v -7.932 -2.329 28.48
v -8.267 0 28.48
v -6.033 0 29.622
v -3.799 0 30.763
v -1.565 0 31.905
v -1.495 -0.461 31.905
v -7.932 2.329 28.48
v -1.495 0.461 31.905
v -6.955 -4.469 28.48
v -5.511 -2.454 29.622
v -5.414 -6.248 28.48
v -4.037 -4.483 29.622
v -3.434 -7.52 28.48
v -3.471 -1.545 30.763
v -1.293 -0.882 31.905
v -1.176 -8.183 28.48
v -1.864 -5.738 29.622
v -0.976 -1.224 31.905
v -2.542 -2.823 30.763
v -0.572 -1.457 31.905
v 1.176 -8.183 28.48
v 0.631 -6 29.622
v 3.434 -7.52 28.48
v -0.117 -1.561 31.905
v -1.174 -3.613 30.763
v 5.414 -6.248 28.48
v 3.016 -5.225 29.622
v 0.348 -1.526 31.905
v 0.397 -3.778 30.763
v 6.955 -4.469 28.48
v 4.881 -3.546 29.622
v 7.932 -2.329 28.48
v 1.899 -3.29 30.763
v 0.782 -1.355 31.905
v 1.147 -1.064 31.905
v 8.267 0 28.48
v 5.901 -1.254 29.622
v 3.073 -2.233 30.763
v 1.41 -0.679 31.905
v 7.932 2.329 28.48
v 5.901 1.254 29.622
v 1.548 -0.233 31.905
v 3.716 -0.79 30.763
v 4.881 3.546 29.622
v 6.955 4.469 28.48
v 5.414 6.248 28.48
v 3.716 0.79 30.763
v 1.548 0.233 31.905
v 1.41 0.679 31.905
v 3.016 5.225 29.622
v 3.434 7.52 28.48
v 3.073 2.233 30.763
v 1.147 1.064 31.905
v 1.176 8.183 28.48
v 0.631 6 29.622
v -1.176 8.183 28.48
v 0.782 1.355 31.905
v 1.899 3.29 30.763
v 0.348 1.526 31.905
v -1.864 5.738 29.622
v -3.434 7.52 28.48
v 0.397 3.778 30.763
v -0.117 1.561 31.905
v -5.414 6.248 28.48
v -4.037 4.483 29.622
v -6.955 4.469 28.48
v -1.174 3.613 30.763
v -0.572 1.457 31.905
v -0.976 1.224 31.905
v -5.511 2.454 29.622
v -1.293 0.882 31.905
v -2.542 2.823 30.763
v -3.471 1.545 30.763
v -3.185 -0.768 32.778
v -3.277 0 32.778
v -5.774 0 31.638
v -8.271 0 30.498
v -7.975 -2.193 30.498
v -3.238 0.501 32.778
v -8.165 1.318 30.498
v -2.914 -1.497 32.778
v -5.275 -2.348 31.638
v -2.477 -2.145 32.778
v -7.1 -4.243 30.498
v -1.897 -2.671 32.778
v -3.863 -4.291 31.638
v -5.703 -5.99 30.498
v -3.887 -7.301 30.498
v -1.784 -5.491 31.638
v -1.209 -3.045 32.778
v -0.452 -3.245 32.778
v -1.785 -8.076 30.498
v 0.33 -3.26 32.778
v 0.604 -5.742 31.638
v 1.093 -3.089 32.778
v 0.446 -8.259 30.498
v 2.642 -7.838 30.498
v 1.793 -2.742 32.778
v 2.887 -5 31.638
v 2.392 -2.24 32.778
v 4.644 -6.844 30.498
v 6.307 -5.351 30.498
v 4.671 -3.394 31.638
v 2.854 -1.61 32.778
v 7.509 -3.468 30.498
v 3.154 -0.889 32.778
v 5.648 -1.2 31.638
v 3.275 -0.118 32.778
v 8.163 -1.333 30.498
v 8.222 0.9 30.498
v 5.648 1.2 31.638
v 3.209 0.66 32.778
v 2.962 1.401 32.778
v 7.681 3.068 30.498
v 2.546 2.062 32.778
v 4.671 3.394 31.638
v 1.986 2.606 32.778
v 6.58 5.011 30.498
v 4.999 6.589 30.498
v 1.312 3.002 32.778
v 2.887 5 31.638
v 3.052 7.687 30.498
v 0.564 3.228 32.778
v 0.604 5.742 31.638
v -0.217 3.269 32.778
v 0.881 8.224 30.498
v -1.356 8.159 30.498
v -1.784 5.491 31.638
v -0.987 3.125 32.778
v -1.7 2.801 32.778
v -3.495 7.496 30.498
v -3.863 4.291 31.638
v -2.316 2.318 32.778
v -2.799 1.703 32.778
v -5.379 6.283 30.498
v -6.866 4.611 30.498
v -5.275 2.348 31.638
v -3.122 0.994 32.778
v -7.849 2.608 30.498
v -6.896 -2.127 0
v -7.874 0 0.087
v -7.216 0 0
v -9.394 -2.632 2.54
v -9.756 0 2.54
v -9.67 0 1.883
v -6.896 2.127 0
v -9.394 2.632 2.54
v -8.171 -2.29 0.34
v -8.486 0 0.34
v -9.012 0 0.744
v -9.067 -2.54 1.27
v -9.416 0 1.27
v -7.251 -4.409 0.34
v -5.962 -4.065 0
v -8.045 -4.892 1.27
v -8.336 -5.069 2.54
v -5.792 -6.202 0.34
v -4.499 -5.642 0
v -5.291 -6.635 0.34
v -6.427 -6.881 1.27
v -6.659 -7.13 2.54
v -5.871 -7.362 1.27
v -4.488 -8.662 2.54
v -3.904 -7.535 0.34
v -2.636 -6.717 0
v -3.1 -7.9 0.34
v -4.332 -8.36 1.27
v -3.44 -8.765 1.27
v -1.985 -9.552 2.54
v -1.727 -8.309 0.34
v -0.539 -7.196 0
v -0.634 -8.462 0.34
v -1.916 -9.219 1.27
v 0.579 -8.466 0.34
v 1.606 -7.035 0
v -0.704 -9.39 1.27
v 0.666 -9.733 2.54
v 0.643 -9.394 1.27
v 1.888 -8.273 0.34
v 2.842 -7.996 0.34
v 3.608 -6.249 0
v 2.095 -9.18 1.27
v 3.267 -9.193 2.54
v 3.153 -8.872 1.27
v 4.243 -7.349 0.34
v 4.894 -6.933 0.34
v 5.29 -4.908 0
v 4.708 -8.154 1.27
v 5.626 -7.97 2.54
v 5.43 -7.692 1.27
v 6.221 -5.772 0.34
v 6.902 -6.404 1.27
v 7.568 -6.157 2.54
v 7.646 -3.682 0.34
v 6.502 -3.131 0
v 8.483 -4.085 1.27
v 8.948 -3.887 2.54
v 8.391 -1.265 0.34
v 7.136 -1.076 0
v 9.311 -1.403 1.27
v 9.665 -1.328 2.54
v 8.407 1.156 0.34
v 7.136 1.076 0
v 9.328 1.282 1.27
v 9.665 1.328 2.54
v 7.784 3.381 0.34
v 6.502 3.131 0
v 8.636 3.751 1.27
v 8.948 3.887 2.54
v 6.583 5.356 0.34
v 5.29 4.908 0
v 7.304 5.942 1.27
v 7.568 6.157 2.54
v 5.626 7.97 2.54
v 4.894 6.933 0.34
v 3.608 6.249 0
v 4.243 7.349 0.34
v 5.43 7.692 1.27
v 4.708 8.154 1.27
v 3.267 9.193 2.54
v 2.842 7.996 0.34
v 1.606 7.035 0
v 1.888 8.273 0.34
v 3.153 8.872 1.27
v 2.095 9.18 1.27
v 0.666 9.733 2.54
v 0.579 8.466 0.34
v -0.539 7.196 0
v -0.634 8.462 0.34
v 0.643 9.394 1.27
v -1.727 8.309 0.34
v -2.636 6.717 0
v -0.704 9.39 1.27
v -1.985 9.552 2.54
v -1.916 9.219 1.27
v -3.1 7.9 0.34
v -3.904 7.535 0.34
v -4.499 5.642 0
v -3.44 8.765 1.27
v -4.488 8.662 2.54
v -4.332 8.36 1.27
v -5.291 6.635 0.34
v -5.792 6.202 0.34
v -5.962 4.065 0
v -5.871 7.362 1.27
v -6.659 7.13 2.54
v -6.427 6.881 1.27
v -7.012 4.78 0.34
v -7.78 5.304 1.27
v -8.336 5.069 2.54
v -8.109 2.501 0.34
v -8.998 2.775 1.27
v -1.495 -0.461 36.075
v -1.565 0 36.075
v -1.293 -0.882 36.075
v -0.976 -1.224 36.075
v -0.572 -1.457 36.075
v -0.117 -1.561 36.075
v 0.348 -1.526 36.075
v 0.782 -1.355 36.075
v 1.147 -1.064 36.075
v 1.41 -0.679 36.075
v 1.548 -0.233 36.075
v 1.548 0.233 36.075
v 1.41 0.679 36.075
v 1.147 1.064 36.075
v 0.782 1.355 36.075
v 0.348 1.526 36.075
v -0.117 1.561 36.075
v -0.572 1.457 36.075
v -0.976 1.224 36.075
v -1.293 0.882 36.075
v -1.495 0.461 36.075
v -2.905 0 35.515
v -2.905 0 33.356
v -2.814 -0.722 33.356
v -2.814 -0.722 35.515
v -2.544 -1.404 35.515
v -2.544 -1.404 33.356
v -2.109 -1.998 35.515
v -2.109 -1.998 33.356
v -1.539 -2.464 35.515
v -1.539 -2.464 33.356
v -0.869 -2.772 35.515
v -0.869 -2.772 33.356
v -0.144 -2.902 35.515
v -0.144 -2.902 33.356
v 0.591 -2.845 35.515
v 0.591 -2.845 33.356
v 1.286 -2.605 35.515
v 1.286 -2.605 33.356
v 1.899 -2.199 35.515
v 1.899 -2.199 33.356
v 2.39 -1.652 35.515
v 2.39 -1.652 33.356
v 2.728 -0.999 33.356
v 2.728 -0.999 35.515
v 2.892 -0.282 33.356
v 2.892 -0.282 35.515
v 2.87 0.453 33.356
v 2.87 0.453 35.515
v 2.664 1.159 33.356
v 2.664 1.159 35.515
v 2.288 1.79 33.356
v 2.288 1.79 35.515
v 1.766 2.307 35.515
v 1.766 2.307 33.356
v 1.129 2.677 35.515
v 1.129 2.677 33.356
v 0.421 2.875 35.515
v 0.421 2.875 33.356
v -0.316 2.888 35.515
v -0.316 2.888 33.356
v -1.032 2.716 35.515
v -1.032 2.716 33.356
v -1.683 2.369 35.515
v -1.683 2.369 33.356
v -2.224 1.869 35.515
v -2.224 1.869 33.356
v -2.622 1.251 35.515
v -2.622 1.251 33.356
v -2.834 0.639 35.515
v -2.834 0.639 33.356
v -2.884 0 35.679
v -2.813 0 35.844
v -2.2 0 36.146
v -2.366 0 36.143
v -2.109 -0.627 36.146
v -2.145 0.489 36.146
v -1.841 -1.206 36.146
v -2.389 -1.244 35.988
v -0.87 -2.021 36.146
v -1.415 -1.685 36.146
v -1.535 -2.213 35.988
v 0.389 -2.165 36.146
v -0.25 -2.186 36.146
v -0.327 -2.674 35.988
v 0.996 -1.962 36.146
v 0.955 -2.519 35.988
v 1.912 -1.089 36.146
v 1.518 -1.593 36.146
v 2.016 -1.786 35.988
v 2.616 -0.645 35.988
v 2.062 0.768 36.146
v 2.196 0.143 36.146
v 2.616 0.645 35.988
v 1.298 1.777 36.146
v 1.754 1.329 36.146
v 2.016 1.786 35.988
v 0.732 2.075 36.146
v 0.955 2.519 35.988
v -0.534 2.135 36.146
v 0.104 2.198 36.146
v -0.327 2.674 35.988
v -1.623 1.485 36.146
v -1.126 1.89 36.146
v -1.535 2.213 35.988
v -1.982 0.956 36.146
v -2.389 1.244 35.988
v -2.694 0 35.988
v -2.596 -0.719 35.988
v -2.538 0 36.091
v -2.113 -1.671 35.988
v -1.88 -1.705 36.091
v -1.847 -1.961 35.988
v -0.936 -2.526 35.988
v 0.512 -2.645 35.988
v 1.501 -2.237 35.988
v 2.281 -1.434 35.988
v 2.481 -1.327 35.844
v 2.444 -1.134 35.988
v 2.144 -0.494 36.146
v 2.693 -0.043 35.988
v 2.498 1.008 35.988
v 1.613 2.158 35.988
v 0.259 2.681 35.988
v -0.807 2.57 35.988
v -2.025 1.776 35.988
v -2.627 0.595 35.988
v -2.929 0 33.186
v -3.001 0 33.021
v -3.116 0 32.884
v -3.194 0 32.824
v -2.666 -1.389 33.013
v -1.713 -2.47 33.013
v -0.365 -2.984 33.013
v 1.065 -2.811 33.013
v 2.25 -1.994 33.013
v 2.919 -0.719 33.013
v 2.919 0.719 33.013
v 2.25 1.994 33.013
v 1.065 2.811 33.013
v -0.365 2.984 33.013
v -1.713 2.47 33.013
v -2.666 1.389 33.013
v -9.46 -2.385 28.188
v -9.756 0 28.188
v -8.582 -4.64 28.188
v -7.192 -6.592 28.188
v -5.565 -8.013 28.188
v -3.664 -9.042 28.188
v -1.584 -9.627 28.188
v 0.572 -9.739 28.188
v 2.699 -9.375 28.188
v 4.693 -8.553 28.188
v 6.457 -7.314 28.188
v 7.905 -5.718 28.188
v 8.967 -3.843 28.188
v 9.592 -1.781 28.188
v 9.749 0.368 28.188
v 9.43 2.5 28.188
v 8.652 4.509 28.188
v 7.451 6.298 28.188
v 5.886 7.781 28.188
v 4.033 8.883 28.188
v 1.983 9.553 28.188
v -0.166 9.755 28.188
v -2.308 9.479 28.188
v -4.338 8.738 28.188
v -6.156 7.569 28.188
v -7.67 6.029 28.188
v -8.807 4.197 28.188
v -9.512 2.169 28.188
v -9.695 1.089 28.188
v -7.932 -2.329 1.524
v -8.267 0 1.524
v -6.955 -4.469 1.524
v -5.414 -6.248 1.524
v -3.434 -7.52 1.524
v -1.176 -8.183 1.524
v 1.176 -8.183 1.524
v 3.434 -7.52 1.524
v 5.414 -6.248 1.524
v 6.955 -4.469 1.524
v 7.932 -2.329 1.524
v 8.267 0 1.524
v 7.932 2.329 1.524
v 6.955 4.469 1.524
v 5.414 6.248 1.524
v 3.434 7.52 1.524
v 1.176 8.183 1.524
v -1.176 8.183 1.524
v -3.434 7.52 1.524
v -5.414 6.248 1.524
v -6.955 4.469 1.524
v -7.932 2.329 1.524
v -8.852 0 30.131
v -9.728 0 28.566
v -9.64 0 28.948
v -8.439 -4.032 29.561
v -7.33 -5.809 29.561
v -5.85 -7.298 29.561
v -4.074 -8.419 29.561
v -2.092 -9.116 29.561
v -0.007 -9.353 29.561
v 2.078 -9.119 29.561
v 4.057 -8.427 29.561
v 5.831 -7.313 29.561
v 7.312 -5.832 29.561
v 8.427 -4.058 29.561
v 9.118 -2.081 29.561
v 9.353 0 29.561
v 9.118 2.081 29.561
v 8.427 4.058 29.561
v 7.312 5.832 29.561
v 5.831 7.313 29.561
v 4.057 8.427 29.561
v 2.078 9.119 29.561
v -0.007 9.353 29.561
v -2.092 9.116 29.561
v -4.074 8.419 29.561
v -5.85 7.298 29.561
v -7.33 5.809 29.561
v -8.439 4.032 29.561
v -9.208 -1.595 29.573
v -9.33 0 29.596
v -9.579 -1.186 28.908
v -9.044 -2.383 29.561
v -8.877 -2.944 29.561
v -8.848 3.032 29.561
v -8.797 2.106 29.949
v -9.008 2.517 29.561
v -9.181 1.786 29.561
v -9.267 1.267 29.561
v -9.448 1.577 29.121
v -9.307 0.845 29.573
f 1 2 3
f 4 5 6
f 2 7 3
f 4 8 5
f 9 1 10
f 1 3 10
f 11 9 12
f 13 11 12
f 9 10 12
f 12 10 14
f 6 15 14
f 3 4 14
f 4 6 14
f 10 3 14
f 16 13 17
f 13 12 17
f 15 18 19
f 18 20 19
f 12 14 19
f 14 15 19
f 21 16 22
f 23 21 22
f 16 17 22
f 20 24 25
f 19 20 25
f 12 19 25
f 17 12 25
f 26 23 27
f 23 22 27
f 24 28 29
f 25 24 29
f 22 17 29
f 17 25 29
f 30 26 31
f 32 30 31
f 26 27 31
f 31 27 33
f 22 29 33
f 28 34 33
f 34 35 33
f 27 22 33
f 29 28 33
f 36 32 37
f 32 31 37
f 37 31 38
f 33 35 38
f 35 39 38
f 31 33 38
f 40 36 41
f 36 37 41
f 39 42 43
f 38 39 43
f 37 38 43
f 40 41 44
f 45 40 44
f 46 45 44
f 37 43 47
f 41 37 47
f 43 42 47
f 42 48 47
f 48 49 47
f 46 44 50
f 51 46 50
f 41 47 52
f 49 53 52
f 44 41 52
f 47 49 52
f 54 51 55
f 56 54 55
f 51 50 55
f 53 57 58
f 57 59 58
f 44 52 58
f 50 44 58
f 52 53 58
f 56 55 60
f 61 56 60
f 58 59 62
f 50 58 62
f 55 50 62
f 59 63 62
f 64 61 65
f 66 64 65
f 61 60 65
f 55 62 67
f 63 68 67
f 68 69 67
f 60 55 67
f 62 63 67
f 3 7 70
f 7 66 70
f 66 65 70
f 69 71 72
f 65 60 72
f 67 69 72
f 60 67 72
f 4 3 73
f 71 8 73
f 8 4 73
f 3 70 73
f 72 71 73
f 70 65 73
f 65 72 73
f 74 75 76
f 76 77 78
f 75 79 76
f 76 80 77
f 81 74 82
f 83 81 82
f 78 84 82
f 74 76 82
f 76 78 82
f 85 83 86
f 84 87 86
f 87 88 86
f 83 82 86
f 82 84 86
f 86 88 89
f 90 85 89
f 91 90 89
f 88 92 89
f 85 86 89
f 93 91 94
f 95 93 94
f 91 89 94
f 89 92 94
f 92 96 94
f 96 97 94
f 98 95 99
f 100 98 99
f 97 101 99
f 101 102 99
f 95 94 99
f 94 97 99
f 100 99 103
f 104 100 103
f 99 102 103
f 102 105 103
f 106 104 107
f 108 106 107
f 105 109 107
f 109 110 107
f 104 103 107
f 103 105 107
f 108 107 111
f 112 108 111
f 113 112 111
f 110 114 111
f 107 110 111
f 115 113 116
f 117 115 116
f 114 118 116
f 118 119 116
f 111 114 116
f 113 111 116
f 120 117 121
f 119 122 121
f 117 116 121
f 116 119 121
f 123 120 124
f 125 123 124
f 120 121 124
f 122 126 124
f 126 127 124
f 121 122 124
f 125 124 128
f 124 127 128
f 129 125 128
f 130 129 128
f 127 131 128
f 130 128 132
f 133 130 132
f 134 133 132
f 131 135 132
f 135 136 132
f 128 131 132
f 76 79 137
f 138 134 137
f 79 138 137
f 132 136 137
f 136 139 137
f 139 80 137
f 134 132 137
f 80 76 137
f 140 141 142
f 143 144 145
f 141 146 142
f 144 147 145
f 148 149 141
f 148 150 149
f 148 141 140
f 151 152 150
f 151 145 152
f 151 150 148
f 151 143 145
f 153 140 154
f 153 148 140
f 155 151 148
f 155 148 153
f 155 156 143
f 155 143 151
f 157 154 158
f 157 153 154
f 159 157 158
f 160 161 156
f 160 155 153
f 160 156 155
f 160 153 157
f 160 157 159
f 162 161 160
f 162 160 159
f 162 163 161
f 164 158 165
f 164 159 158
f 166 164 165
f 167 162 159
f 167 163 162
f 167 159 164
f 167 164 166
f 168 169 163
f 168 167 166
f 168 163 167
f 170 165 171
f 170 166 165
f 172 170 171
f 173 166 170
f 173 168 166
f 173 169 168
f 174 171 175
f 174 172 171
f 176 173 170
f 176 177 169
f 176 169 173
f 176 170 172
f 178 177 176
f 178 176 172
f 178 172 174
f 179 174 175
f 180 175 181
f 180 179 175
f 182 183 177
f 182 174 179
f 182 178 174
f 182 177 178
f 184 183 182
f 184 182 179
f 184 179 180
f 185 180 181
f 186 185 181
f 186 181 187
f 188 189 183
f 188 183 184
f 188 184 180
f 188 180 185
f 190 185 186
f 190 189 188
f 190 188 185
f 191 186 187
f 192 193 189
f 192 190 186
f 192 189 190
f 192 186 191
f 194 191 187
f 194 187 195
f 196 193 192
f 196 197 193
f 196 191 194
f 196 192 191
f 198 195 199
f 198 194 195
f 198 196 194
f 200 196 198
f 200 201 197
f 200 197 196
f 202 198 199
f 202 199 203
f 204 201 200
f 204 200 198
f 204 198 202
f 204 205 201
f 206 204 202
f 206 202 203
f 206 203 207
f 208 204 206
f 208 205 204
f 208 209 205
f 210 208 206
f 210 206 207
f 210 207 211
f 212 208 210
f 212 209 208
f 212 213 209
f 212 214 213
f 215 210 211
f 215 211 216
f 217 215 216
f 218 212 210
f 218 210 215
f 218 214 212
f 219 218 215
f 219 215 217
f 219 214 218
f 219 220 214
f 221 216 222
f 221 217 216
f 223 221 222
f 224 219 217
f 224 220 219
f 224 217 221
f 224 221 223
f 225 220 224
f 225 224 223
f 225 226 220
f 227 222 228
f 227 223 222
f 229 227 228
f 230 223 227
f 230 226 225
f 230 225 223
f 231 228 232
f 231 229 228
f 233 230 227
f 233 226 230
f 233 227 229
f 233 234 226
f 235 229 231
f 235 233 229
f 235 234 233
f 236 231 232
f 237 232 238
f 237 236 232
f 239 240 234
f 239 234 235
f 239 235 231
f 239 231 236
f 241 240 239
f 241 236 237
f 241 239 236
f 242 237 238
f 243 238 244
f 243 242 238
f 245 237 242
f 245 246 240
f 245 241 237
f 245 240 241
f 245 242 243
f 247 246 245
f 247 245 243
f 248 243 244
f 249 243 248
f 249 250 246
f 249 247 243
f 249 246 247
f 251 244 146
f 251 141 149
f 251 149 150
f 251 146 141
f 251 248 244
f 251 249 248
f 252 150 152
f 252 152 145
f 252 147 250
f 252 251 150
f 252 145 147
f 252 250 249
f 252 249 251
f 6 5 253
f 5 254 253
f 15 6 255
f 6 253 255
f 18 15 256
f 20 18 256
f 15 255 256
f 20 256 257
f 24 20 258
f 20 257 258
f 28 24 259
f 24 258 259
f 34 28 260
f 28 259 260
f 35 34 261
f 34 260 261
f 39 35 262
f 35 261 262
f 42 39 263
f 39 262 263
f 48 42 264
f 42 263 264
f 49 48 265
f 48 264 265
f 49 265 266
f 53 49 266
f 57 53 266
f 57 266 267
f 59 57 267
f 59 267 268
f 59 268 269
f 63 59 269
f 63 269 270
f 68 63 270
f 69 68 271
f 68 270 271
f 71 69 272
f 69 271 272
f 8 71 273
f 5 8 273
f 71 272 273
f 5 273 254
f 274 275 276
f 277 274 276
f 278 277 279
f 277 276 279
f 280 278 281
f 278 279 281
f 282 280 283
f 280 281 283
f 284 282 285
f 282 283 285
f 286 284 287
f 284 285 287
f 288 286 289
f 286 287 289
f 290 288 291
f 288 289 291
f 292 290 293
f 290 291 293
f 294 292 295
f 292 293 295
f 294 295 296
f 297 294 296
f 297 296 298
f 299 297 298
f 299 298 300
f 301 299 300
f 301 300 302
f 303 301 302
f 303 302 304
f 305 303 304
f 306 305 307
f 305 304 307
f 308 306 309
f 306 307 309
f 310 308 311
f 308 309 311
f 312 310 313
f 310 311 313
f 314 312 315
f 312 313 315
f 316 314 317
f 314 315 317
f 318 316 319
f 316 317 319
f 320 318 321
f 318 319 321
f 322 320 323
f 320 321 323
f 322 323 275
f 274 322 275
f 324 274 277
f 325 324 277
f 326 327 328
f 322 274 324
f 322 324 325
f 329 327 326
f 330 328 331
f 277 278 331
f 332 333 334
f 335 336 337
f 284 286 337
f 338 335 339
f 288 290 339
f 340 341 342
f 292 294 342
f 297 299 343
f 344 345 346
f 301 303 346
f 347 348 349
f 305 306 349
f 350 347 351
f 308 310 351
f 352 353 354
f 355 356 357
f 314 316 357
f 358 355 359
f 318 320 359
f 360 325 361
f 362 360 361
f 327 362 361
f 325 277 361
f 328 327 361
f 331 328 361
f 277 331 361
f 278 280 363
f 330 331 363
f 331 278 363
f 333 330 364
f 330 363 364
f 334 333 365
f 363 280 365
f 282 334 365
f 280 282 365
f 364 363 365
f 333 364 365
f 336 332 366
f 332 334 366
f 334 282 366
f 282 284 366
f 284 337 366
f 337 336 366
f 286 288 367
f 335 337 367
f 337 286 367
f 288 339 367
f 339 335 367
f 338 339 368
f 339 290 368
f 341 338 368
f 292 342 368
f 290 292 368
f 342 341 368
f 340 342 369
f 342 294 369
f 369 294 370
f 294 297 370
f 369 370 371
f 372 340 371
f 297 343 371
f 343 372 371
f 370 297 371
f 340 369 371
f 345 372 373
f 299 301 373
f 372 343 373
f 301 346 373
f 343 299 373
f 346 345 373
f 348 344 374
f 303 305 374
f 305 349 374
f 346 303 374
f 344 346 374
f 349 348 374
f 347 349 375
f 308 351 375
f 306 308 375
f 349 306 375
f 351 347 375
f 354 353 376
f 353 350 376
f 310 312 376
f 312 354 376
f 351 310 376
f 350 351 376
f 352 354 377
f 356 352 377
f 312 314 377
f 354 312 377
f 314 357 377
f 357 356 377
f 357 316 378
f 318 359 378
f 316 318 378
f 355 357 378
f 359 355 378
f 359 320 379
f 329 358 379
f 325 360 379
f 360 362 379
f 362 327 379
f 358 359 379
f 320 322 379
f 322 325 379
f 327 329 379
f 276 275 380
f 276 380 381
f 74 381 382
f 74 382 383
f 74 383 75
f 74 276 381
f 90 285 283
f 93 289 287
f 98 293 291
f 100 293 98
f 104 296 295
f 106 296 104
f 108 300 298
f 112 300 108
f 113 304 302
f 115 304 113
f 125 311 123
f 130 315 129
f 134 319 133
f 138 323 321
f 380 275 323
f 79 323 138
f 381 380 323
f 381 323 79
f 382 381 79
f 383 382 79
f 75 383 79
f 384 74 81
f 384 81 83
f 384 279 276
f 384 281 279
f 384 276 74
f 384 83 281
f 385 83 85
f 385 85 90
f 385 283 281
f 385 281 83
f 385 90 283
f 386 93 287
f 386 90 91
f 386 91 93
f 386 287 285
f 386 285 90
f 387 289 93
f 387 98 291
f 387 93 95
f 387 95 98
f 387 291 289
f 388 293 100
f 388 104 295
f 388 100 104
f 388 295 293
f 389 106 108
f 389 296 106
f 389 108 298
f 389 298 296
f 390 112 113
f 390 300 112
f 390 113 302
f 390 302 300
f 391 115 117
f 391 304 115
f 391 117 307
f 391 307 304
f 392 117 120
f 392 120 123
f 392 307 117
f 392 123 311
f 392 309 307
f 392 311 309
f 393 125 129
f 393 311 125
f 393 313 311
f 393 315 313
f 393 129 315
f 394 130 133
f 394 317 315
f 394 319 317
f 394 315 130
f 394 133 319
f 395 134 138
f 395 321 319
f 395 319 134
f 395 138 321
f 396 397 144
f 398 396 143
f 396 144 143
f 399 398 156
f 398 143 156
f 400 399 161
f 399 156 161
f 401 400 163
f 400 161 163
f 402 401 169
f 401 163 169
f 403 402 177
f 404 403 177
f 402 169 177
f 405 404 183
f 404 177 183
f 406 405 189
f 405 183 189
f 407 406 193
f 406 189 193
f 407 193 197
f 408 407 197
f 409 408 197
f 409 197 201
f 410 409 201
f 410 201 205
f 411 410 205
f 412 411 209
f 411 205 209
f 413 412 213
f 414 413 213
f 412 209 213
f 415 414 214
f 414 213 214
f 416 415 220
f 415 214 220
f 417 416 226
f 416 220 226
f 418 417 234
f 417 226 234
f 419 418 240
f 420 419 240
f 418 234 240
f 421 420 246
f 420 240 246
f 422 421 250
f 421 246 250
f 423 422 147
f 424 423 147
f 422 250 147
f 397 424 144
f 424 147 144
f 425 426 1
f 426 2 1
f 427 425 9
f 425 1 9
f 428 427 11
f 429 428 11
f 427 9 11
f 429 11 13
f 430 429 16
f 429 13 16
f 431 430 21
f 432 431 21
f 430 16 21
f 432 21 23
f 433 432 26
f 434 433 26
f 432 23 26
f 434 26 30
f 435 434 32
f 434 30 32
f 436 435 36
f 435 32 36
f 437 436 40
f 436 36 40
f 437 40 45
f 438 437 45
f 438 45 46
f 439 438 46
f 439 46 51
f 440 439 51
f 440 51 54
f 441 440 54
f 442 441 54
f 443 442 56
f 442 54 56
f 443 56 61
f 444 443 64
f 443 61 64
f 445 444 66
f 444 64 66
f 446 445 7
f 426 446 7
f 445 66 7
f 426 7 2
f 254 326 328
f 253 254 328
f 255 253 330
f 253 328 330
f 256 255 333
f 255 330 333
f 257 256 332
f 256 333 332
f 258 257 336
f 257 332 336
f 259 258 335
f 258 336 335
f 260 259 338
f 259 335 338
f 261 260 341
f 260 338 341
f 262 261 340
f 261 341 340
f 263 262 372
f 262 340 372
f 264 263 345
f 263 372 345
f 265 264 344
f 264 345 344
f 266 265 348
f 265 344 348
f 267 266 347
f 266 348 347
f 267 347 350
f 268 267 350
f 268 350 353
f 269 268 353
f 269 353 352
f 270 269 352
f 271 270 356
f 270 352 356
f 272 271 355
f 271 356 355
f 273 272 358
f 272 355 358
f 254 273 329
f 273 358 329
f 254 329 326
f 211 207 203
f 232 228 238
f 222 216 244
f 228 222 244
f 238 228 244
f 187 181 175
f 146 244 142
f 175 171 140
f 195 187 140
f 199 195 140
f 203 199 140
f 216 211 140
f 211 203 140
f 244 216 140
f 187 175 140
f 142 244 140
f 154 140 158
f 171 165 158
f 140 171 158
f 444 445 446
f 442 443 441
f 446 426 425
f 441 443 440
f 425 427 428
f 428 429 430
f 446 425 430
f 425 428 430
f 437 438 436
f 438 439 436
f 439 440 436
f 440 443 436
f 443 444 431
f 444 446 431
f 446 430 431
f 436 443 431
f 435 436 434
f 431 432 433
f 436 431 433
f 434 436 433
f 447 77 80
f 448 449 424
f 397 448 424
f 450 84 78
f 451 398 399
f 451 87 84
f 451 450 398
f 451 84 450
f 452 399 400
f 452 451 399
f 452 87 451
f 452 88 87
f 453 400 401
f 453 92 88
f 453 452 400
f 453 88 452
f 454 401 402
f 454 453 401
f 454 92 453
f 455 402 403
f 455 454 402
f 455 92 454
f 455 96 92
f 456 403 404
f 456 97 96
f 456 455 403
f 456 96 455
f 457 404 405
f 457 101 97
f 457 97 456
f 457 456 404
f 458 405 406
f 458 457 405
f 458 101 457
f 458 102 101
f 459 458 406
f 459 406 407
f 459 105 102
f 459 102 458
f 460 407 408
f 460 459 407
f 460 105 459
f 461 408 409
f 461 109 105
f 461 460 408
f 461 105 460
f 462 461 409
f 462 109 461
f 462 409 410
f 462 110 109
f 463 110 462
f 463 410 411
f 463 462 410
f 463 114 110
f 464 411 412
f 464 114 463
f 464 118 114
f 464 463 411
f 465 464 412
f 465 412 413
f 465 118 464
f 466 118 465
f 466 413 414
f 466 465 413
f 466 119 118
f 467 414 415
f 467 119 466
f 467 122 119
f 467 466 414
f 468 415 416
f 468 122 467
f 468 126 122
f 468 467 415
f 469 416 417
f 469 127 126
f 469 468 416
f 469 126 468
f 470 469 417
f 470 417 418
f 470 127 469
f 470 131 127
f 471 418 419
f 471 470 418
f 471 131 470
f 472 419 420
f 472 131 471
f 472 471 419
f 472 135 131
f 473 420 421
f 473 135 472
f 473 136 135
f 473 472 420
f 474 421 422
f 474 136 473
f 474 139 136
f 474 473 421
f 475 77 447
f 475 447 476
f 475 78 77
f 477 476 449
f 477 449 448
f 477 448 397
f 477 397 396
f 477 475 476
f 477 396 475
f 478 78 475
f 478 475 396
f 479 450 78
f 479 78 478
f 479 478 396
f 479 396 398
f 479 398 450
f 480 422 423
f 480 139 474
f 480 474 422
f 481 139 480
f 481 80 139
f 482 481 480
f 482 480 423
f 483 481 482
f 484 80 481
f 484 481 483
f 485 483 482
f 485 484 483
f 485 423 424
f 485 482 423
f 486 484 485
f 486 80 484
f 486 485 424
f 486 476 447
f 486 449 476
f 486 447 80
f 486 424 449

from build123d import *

# Parameters (mm, degrees)
F2_R = 2.54
F3_R = 0.635
F4_R = 0.635


with BuildPart() as f1:
    # F0 (on Front) → F1 (revolve)
    with BuildSketch(Plane.XZ):
        Polygon((-9.756139, 0), (0, 0), (0, 1.523547), (-8.266838, 1.523547), (-8.266838, 28.479891), (-1.564985, 31.905282), (-1.564985, 36.075324), (-2.905356, 36.224253), (-2.905356, 32.947794), (-9.756139, 29.820262), align=None)
    revolve(axis=Axis((0, 0, 0.761774), (0, 0, 1)))

    # F2
    f2_edges = [f1.edges().sort_by_distance(p)[0] for p in [
        (9.756139, 0, 29.820262),
        (9.756139, 0, 0),
        (-9.756139, 0, 14.910131),
    ]]
    fillet(f2_edges, radius=F2_R)

    # F3
    f3_edges = [f1.edges().sort_by_distance(p)[0] for p in [
        (2.905356, 0, 36.224253),
    ]]
    fillet(f3_edges, radius=F3_R)

    # F4
    f4_edges = [f1.edges().sort_by_distance(p)[0] for p in [
        (2.905356, 0, 32.947794),
    ]]
    fillet(f4_edges, radius=F4_R)


solid = f1.part
